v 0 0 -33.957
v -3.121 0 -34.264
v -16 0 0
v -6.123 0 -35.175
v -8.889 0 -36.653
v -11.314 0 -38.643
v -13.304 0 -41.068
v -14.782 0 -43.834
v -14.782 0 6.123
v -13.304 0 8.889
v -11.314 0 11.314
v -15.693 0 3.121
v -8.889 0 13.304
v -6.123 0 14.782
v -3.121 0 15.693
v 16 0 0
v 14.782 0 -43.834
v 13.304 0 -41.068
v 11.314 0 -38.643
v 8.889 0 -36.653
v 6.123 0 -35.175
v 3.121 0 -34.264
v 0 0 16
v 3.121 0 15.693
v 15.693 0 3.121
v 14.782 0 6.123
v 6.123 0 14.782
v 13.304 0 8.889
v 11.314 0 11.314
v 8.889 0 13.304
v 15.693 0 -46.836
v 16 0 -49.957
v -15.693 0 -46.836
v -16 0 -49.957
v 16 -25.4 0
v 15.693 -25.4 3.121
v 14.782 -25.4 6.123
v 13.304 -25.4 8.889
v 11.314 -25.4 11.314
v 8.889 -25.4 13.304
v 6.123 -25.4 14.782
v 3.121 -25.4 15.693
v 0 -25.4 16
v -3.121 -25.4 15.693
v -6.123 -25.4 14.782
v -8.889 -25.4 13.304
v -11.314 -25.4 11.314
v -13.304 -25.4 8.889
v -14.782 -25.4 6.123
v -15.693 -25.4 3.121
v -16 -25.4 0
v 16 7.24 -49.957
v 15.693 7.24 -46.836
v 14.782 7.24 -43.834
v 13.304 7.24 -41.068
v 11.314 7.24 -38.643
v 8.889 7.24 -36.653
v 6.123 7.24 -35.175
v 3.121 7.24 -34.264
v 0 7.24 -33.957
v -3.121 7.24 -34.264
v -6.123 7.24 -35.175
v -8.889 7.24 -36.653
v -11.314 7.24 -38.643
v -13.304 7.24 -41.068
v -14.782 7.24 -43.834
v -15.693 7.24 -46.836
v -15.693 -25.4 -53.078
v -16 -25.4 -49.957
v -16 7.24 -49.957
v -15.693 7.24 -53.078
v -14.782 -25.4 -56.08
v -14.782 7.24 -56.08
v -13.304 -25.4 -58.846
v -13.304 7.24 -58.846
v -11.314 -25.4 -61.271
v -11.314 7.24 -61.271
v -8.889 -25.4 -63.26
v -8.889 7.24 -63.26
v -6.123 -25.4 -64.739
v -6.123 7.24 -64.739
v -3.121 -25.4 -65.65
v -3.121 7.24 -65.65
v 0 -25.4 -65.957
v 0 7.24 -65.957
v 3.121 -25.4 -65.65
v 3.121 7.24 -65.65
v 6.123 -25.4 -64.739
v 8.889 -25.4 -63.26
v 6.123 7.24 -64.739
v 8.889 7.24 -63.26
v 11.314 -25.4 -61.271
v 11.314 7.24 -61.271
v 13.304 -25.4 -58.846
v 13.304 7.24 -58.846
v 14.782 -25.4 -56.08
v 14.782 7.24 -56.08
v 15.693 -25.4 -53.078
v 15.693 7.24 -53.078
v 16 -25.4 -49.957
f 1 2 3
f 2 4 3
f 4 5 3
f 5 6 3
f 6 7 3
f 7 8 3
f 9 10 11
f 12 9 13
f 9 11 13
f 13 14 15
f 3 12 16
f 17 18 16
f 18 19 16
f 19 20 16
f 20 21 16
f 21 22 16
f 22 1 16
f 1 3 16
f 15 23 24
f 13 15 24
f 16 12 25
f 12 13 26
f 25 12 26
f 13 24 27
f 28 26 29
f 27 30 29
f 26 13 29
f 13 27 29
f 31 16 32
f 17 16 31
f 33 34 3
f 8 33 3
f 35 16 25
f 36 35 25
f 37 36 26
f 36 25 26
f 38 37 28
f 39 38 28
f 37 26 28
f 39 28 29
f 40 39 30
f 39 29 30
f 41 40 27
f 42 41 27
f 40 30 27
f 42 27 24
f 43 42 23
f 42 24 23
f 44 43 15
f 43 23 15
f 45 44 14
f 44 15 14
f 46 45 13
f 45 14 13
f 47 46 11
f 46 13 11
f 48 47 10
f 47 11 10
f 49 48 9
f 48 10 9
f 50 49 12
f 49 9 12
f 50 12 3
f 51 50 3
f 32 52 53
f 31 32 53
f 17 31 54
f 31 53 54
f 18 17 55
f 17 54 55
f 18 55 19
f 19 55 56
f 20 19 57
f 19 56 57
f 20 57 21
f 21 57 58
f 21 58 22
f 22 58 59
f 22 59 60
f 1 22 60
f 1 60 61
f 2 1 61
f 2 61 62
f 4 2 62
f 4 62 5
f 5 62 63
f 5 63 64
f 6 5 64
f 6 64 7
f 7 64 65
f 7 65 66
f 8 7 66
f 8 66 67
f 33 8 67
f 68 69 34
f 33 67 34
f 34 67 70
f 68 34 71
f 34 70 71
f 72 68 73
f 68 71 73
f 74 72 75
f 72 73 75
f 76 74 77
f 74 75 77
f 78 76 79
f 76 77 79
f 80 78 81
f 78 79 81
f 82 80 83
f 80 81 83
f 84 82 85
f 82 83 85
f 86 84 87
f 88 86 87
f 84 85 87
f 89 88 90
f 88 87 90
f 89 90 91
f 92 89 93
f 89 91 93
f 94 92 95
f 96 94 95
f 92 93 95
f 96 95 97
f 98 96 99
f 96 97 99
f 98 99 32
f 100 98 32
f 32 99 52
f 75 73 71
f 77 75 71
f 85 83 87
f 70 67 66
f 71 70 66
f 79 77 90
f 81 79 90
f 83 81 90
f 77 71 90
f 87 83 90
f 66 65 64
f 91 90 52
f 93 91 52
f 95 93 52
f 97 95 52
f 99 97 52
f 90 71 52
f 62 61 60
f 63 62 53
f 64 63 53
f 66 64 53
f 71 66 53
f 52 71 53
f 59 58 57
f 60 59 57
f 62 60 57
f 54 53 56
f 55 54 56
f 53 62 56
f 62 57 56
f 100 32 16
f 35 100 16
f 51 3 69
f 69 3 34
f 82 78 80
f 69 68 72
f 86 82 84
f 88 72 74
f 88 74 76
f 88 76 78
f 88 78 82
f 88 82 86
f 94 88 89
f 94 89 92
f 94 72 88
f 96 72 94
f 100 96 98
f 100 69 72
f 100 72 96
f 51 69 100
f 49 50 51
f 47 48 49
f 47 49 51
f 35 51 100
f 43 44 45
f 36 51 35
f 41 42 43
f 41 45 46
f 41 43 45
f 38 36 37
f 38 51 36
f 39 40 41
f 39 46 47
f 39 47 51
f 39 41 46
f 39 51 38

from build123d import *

# Parameters (mm, degrees)
F1_DEPTH = 7.24
F2_DEPTH = 25.4


with BuildPart() as f1:
    # F0 (on Front) → F1 (new body)
    with BuildSketch(Plane.XZ):
        with BuildLine():
            ThreePointArc((-16, -49.9569810927), (0, -65.9569810927), (16, -49.9569810927))
            ThreePointArc((16, -49.9569810927), (0, -33.9569810927), (-16, -49.9569810927))
        make_face()
    extrude(amount=-F1_DEPTH)

    # F0 (on Front) → F2 (join)
    with BuildSketch(Plane.XZ):
        with BuildLine():
            ThreePointArc((-16, 0), (0, -16), (16, 0))
            ThreePointArc((16, 0), (0, 16), (-16, 0))
        make_face()
        with BuildLine():
            Line((16, -49.9569810927), (16, 0))
            ThreePointArc((16, 0), (0, -16), (-16, 0))
            Line((-16, 0), (-16, -49.9569810927))
            ThreePointArc((-16, -49.9569810927), (0, -33.9569810927), (16, -49.9569810927))
        make_face()
        with BuildLine():
            ThreePointArc((-16, -49.9569810927), (0, -65.9569810927), (16, -49.9569810927))
            ThreePointArc((16, -49.9569810927), (0, -33.9569810927), (-16, -49.9569810927))
        make_face()
    extrude(amount=F2_DEPTH)


solid = f1.part
